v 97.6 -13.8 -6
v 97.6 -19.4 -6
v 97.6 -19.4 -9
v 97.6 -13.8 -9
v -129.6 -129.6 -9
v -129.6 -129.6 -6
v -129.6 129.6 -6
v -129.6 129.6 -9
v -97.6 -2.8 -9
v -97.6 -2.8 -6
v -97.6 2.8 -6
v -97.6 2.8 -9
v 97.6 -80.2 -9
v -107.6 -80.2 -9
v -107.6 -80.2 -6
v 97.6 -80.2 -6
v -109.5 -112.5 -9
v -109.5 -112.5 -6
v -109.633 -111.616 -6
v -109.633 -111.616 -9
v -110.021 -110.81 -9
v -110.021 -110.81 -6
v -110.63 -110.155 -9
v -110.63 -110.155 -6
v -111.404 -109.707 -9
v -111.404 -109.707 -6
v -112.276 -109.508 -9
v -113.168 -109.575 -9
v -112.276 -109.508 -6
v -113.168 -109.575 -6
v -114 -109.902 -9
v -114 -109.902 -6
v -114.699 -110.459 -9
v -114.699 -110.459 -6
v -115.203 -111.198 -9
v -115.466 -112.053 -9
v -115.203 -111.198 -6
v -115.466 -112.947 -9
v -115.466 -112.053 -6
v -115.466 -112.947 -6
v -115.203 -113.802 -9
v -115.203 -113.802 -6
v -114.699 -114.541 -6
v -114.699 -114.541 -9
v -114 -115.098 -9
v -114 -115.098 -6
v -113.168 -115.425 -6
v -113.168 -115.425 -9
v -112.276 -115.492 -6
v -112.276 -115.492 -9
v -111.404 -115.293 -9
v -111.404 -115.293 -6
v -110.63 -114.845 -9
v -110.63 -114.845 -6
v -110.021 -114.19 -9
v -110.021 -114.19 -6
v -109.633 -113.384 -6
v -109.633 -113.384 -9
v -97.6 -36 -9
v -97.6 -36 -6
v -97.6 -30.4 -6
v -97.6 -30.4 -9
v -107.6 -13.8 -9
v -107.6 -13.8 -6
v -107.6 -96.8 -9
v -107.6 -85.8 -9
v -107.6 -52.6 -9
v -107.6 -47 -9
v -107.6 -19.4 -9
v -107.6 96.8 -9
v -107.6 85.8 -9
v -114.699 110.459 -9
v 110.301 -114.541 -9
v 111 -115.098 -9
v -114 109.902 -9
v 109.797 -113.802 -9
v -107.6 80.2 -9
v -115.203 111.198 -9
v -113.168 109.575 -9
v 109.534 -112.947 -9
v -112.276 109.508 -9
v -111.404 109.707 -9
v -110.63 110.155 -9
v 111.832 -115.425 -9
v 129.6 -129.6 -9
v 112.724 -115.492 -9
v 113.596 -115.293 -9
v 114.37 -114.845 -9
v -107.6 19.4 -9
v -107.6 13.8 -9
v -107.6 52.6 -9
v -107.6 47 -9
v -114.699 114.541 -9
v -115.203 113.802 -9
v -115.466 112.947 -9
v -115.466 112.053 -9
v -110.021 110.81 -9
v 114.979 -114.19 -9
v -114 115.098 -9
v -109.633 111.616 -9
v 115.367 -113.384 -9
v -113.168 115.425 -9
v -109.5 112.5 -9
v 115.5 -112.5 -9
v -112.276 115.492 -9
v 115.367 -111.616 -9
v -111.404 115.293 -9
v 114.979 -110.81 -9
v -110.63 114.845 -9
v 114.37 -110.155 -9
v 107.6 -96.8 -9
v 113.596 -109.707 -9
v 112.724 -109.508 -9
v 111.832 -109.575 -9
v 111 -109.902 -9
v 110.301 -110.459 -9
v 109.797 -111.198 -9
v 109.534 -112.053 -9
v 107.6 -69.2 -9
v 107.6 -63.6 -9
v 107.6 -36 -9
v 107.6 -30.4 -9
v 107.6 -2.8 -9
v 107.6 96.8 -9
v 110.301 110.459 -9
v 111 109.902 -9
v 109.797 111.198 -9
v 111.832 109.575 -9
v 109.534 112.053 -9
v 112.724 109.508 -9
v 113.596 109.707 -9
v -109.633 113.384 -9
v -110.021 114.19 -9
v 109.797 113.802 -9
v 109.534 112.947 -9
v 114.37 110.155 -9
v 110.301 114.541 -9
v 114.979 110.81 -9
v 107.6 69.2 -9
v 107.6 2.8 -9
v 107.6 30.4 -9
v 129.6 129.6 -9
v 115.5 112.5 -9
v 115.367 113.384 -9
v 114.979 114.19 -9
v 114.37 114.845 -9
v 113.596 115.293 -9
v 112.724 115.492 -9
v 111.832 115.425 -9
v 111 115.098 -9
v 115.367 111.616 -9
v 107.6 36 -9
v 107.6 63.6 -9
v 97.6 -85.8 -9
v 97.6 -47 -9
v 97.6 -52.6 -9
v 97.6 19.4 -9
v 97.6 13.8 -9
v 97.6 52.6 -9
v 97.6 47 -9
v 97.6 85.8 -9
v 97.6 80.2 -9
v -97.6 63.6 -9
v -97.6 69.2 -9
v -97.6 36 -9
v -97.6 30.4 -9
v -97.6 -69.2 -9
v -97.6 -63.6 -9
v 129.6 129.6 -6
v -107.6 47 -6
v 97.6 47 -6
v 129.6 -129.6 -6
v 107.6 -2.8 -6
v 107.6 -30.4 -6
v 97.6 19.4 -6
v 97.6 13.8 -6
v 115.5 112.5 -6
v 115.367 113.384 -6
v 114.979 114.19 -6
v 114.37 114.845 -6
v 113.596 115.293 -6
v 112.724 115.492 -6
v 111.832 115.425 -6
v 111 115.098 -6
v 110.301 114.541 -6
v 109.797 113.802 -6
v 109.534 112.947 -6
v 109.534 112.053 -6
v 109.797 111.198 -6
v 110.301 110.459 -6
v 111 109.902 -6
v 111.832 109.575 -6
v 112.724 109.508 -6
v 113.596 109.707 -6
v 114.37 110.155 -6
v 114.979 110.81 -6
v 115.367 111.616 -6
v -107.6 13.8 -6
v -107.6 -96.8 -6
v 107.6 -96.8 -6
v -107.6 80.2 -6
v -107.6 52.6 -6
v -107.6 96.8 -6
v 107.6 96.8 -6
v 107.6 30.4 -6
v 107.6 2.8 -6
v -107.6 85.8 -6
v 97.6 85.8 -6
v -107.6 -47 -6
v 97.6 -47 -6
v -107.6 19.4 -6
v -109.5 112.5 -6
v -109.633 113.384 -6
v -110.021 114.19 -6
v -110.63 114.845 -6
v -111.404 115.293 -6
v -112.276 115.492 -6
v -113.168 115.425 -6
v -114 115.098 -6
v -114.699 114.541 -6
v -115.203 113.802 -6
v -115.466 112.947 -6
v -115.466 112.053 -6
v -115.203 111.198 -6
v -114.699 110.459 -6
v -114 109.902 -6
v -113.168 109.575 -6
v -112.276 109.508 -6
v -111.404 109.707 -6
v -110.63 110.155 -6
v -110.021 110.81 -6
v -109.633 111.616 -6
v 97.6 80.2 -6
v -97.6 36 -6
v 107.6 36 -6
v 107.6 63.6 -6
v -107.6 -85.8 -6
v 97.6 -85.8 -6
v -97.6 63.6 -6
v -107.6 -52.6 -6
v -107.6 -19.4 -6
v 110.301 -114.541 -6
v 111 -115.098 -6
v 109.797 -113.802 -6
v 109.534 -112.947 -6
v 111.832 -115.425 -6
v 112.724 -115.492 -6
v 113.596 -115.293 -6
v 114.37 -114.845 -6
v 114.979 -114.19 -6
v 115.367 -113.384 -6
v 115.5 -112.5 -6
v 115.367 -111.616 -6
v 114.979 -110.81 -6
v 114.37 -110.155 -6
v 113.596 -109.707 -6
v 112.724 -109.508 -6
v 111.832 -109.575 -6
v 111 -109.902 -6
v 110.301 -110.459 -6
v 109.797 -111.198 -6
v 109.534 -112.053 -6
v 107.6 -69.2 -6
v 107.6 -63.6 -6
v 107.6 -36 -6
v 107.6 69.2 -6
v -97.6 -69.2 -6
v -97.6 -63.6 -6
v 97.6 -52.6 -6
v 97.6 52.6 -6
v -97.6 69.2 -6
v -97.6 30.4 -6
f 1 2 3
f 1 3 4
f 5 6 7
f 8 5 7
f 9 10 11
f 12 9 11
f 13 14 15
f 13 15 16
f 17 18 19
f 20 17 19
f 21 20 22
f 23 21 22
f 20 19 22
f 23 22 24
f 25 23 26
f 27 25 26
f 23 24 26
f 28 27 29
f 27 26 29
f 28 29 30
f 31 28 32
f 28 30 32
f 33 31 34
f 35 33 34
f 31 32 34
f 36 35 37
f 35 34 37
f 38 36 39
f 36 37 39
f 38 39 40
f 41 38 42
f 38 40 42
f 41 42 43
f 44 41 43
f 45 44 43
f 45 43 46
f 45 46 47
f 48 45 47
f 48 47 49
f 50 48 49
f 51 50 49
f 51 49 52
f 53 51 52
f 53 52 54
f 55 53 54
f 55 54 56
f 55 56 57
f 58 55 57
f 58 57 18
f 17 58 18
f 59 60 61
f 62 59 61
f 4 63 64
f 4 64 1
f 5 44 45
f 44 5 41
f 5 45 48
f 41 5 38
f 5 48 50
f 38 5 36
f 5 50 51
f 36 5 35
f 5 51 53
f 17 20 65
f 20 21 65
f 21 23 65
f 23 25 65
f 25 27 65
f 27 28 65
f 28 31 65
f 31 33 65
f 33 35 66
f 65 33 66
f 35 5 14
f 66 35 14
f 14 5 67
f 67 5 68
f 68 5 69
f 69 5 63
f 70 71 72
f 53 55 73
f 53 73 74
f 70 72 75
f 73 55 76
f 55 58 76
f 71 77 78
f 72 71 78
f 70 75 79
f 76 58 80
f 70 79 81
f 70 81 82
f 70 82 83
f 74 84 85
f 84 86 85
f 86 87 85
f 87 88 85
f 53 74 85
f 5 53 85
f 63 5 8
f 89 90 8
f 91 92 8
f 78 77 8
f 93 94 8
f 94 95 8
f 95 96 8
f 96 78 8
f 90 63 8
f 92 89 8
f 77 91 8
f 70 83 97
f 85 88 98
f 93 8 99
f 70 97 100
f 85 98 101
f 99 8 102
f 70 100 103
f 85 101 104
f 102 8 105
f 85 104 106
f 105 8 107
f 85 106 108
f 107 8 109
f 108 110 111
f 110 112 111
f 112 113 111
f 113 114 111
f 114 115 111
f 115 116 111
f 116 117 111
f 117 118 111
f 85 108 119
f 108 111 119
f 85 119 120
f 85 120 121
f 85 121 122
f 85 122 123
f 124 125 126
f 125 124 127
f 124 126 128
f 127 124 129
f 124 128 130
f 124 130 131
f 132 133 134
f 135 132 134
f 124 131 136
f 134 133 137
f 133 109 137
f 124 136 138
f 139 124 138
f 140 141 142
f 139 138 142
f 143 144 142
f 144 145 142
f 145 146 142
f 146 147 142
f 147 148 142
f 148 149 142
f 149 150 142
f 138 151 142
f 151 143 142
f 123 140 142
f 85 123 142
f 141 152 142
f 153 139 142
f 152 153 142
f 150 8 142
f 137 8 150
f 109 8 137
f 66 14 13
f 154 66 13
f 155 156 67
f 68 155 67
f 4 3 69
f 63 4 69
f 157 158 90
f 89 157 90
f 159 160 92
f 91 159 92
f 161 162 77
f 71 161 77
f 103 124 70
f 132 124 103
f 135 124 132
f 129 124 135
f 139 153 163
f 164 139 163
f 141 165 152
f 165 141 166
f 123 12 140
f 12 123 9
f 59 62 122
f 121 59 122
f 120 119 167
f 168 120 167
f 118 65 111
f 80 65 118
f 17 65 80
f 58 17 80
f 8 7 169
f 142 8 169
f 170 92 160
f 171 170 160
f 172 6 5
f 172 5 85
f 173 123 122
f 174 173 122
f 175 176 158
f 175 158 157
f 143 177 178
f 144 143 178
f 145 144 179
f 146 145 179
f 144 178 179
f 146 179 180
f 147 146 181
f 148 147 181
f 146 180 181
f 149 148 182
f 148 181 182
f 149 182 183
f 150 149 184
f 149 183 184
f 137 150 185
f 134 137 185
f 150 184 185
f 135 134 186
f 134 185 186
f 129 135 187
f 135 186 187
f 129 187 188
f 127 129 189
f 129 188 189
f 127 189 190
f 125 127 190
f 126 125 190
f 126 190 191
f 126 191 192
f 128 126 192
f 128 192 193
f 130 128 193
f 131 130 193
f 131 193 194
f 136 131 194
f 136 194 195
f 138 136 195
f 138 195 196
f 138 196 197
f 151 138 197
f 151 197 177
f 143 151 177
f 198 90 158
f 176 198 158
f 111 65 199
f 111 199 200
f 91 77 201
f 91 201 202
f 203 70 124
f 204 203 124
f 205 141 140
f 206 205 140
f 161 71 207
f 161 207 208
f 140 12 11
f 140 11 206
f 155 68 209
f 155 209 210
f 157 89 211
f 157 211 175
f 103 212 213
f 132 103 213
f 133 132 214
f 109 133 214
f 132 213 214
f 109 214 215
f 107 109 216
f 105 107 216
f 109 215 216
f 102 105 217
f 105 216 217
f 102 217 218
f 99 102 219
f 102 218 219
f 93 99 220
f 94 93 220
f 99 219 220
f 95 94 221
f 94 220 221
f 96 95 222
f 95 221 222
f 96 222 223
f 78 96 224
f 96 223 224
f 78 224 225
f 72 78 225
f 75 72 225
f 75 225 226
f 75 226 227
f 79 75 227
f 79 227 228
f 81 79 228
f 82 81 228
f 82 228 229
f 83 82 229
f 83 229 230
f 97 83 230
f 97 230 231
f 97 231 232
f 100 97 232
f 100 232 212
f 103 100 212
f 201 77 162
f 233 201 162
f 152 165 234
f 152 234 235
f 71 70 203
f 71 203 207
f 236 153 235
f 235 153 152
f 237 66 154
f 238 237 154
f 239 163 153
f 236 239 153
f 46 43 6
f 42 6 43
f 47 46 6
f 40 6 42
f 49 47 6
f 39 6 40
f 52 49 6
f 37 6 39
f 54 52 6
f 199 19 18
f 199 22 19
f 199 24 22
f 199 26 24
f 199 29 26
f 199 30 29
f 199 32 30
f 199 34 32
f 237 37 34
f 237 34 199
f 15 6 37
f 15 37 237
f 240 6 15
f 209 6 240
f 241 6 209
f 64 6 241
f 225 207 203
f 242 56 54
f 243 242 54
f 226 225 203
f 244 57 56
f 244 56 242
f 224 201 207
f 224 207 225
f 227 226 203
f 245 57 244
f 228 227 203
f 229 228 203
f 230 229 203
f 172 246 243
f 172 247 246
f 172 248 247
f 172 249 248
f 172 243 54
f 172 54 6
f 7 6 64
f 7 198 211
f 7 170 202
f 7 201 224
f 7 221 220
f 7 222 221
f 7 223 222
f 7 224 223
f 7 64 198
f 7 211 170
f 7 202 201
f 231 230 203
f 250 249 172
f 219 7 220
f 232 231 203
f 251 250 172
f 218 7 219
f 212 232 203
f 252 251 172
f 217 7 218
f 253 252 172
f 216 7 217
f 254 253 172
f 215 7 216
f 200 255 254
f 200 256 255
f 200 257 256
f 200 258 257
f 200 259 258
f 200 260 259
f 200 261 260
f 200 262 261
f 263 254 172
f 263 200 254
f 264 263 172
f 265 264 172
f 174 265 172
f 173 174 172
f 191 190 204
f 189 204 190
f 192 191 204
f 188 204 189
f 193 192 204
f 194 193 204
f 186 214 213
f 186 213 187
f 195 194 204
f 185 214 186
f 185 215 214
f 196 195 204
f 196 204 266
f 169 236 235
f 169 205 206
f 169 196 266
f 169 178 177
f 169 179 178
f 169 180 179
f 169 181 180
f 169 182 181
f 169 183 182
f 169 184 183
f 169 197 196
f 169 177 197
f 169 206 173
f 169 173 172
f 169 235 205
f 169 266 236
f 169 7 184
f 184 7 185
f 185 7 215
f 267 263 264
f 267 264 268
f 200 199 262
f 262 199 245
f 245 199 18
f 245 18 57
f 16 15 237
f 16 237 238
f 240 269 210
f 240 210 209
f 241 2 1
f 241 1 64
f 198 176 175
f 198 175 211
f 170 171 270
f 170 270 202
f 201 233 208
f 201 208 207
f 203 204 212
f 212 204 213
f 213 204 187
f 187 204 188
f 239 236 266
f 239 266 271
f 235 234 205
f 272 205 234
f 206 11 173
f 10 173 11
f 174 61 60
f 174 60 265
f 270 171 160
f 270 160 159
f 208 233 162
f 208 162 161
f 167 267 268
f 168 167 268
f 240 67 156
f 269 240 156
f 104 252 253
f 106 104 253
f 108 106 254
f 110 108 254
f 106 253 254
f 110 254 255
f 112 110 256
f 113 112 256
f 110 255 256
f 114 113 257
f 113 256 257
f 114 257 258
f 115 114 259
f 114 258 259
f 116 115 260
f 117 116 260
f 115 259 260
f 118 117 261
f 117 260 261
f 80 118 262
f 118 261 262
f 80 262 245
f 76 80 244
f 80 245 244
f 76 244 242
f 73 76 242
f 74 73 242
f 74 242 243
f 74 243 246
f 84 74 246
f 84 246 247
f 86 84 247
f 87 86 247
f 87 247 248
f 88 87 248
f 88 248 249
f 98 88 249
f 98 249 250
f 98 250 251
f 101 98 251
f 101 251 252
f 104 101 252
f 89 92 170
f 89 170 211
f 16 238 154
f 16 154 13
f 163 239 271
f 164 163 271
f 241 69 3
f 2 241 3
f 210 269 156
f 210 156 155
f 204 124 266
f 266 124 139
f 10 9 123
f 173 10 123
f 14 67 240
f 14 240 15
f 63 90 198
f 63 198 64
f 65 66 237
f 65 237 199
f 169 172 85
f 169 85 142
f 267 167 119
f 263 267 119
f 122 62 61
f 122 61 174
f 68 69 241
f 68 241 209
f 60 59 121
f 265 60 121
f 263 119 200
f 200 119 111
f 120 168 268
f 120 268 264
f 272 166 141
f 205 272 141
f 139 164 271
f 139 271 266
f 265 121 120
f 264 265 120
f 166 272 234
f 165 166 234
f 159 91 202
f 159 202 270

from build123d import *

# Parameters (mm, degrees)
SKETCH005_W            = 259.2
SKETCH005_H            = 259.2
PAD003_DEPTH           = 3
SKETCH006_W            = 215.2
SKETCH006_H            = 11
POCKET002_DEPTH        = 3.001
LINEARPATTERN004_COUNT = 12
LINEARPATTERN004_PITCH = 16.6
SKETCH009_W            = 10
SKETCH009_H            = 27.6
POCKET004_DEPTH        = 742.153863
LINEARPATTERN006_COUNT = 6
LINEARPATTERN006_PITCH = 33.2
SKETCH010_W            = 10
SKETCH010_H            = 27.6
POCKET005_DEPTH        = 9.001
LINEARPATTERN007_COUNT = 5
LINEARPATTERN007_PITCH = 33.2
SKETCH012_R            = 3
POCKET007_DEPTH        = 9.001


with BuildPart() as part:
    # Sketch005 → Pad003 (new body)
    with BuildSketch(Plane.XY.offset(-6)):
        Rectangle(SKETCH005_W, SKETCH005_H)
    extrude(amount=-PAD003_DEPTH)

    # Sketch006 (on Face6 of Pad003) → Pocket002 (cut, through all)
    with BuildSketch(Plane(origin=(0, 0, -9), x_dir=(1, 0, 0), z_dir=(0, 0, -1))):
        with Locations((0, 91.3)):
            Rectangle(SKETCH006_W, SKETCH006_H)
    pocket002 = extrude(amount=-POCKET002_DEPTH, mode=Mode.SUBTRACT)

    # LinearPattern004: Pocket002 ×12
    with Locations(*[(0, i * LINEARPATTERN004_PITCH, 0) for i in range(1, LINEARPATTERN004_COUNT)]):
        add(pocket002, mode=Mode.SUBTRACT)

    # Sketch009 → Pocket004 (cut, through all)
    with BuildSketch(Plane.XY):
        with Locations((102.6, 83)):
            Rectangle(SKETCH009_W, SKETCH009_H)
    pocket004 = extrude(amount=-POCKET004_DEPTH, mode=Mode.SUBTRACT)

    # LinearPattern006: Pocket004 ×6
    with Locations(*[(0, -i * LINEARPATTERN006_PITCH, 0) for i in range(1, LINEARPATTERN006_COUNT)]):
        add(pocket004, mode=Mode.SUBTRACT)

    # Sketch010 → Pocket005 (cut, through all)
    with BuildSketch(Plane.XY):
        with Locations((-102.6, 66.4)):
            Rectangle(SKETCH010_W, SKETCH010_H)
    pocket005 = extrude(amount=-POCKET005_DEPTH, mode=Mode.SUBTRACT)

    # LinearPattern007: Pocket005 ×5
    with Locations(*[(0, -i * LINEARPATTERN007_PITCH, 0) for i in range(1, LINEARPATTERN007_COUNT)]):
        add(pocket005, mode=Mode.SUBTRACT)

    # Sketch012 → Pocket007 (cut, through all)
    with BuildSketch(Plane.XY):
        with Locations((-112.5, 112.5)):
            Circle(SKETCH012_R)
        with Locations((112.5, 112.5)):
            Circle(SKETCH012_R)
        with Locations((112.5, -112.5)):
            Circle(SKETCH012_R)
        with Locations((-112.5, -112.5)):
            Circle(SKETCH012_R)
    extrude(amount=-POCKET007_DEPTH, mode=Mode.SUBTRACT)


solid = part.part
